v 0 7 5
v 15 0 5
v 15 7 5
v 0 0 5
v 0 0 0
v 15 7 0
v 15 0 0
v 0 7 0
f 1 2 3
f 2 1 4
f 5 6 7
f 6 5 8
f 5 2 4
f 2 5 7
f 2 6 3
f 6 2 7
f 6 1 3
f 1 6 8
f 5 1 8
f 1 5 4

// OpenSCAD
// Generated by SolidPython 1.0.1 on 2020-07-29 00:46:55


cube(size = [15, 7, 5]);
/***********************************************
*********      SolidPython code:      **********
************************************************
 
# import packages: SolidPython
from solid import *
from solid.utils import *
from itertools import chain, combinations, permutations


class Resize:

    def __init__(self, scad_file):
        self.scad_file = scad_file
        #self.scad_file = import_scad(scad_file)
        # cone/cylinder param:
        self.r1 = 0
        self.r2 = 0
        self.h = 0
        # rectangular prism param:
        self.w = 0
        self.l = 0
        # ellipse param:
        self.r = 0

    # import OpenScad code (file name corresponds to shape)


    # classify shape + parameters
    def assign(self, param1, param2, param3):
        if self.scad_file == 'cone.scad':
            self.r1 = param1
            self.r2 = param2
            self.h = param3
        elif self.scad_file == 'cylinder.scad':
            self.r1 = param1
            self.r2 = param2
            self.h = param3
        elif self.scad_file == 'rectangularPrism.scad':
            self.h = param1
            self.l = param2
            self.w = param3
        else:
            self.r = param1
            self.h = param2

    # resize parameters
    def iterate(self):
        x = range(3, 20, 2)
        i = 1
        if self.scad_file == 'cone.scad':
            tempList = list(permutations(x, 2))
            for temp in tempList:
                param1 = temp[0]
                param2 = temp[1]
                filepath = 'produced_scad_files/' + 'cone' + str(param1) + '_' + str(param2) + '_' + '.scad'
                scad_render_to_file(cylinder(h=param1, r1=param2, r2=0), filepath)

        elif self.scad_file == 'cylinder.scad':
            tempList = list(permutations(x, 3))
            for temp in tempList:
                param1 = temp[0]
                param2 = temp[1]
                filepath = 'produced_scad_files/' + 'cylinder' + str(param1) + '_' + str(param2) + '_' + '.scad'
                scad_render_to_file(cylinder(h=param1, r1=param2, r2=param2), filepath)

        elif self.scad_file == 'rectangularPrism.scad':
            tempList = list(permutations(x, 3))
            for temp in tempList:
                param1 = temp[0]
                param2 = temp[1]
                param3 = temp[2]
                filepath = 'produced_scad_files/' + 'rectangularPrism' + str(param1) + '_' + str(param2) + '_' + str(
                    param3) + '.scad'
                scad_render_to_file(cube(size=(param1, param2, param3)), filepath)

        elif self.scad_file == 'ellipse.scad':
            tempList = list(permutations(x, 4))
            for temp in tempList:
                param1 = temp[0]
                param2 = temp[1]
                param3 = temp[2]
                param4 = temp[3]
                filepath = 'produced_scad_files/' + 'ellipse' + str(param1) + '_' + str(param2) + '_' + str(param3) + '_' + str(param4) + '.scad'
                scad_render_to_file(scale([param1, param2, param3])(sphere(r=param4)), filepath)

    def render_to_scadfile(self):
        scad_render_to_file(scad, 'example.scad') 
 
************************************************/
